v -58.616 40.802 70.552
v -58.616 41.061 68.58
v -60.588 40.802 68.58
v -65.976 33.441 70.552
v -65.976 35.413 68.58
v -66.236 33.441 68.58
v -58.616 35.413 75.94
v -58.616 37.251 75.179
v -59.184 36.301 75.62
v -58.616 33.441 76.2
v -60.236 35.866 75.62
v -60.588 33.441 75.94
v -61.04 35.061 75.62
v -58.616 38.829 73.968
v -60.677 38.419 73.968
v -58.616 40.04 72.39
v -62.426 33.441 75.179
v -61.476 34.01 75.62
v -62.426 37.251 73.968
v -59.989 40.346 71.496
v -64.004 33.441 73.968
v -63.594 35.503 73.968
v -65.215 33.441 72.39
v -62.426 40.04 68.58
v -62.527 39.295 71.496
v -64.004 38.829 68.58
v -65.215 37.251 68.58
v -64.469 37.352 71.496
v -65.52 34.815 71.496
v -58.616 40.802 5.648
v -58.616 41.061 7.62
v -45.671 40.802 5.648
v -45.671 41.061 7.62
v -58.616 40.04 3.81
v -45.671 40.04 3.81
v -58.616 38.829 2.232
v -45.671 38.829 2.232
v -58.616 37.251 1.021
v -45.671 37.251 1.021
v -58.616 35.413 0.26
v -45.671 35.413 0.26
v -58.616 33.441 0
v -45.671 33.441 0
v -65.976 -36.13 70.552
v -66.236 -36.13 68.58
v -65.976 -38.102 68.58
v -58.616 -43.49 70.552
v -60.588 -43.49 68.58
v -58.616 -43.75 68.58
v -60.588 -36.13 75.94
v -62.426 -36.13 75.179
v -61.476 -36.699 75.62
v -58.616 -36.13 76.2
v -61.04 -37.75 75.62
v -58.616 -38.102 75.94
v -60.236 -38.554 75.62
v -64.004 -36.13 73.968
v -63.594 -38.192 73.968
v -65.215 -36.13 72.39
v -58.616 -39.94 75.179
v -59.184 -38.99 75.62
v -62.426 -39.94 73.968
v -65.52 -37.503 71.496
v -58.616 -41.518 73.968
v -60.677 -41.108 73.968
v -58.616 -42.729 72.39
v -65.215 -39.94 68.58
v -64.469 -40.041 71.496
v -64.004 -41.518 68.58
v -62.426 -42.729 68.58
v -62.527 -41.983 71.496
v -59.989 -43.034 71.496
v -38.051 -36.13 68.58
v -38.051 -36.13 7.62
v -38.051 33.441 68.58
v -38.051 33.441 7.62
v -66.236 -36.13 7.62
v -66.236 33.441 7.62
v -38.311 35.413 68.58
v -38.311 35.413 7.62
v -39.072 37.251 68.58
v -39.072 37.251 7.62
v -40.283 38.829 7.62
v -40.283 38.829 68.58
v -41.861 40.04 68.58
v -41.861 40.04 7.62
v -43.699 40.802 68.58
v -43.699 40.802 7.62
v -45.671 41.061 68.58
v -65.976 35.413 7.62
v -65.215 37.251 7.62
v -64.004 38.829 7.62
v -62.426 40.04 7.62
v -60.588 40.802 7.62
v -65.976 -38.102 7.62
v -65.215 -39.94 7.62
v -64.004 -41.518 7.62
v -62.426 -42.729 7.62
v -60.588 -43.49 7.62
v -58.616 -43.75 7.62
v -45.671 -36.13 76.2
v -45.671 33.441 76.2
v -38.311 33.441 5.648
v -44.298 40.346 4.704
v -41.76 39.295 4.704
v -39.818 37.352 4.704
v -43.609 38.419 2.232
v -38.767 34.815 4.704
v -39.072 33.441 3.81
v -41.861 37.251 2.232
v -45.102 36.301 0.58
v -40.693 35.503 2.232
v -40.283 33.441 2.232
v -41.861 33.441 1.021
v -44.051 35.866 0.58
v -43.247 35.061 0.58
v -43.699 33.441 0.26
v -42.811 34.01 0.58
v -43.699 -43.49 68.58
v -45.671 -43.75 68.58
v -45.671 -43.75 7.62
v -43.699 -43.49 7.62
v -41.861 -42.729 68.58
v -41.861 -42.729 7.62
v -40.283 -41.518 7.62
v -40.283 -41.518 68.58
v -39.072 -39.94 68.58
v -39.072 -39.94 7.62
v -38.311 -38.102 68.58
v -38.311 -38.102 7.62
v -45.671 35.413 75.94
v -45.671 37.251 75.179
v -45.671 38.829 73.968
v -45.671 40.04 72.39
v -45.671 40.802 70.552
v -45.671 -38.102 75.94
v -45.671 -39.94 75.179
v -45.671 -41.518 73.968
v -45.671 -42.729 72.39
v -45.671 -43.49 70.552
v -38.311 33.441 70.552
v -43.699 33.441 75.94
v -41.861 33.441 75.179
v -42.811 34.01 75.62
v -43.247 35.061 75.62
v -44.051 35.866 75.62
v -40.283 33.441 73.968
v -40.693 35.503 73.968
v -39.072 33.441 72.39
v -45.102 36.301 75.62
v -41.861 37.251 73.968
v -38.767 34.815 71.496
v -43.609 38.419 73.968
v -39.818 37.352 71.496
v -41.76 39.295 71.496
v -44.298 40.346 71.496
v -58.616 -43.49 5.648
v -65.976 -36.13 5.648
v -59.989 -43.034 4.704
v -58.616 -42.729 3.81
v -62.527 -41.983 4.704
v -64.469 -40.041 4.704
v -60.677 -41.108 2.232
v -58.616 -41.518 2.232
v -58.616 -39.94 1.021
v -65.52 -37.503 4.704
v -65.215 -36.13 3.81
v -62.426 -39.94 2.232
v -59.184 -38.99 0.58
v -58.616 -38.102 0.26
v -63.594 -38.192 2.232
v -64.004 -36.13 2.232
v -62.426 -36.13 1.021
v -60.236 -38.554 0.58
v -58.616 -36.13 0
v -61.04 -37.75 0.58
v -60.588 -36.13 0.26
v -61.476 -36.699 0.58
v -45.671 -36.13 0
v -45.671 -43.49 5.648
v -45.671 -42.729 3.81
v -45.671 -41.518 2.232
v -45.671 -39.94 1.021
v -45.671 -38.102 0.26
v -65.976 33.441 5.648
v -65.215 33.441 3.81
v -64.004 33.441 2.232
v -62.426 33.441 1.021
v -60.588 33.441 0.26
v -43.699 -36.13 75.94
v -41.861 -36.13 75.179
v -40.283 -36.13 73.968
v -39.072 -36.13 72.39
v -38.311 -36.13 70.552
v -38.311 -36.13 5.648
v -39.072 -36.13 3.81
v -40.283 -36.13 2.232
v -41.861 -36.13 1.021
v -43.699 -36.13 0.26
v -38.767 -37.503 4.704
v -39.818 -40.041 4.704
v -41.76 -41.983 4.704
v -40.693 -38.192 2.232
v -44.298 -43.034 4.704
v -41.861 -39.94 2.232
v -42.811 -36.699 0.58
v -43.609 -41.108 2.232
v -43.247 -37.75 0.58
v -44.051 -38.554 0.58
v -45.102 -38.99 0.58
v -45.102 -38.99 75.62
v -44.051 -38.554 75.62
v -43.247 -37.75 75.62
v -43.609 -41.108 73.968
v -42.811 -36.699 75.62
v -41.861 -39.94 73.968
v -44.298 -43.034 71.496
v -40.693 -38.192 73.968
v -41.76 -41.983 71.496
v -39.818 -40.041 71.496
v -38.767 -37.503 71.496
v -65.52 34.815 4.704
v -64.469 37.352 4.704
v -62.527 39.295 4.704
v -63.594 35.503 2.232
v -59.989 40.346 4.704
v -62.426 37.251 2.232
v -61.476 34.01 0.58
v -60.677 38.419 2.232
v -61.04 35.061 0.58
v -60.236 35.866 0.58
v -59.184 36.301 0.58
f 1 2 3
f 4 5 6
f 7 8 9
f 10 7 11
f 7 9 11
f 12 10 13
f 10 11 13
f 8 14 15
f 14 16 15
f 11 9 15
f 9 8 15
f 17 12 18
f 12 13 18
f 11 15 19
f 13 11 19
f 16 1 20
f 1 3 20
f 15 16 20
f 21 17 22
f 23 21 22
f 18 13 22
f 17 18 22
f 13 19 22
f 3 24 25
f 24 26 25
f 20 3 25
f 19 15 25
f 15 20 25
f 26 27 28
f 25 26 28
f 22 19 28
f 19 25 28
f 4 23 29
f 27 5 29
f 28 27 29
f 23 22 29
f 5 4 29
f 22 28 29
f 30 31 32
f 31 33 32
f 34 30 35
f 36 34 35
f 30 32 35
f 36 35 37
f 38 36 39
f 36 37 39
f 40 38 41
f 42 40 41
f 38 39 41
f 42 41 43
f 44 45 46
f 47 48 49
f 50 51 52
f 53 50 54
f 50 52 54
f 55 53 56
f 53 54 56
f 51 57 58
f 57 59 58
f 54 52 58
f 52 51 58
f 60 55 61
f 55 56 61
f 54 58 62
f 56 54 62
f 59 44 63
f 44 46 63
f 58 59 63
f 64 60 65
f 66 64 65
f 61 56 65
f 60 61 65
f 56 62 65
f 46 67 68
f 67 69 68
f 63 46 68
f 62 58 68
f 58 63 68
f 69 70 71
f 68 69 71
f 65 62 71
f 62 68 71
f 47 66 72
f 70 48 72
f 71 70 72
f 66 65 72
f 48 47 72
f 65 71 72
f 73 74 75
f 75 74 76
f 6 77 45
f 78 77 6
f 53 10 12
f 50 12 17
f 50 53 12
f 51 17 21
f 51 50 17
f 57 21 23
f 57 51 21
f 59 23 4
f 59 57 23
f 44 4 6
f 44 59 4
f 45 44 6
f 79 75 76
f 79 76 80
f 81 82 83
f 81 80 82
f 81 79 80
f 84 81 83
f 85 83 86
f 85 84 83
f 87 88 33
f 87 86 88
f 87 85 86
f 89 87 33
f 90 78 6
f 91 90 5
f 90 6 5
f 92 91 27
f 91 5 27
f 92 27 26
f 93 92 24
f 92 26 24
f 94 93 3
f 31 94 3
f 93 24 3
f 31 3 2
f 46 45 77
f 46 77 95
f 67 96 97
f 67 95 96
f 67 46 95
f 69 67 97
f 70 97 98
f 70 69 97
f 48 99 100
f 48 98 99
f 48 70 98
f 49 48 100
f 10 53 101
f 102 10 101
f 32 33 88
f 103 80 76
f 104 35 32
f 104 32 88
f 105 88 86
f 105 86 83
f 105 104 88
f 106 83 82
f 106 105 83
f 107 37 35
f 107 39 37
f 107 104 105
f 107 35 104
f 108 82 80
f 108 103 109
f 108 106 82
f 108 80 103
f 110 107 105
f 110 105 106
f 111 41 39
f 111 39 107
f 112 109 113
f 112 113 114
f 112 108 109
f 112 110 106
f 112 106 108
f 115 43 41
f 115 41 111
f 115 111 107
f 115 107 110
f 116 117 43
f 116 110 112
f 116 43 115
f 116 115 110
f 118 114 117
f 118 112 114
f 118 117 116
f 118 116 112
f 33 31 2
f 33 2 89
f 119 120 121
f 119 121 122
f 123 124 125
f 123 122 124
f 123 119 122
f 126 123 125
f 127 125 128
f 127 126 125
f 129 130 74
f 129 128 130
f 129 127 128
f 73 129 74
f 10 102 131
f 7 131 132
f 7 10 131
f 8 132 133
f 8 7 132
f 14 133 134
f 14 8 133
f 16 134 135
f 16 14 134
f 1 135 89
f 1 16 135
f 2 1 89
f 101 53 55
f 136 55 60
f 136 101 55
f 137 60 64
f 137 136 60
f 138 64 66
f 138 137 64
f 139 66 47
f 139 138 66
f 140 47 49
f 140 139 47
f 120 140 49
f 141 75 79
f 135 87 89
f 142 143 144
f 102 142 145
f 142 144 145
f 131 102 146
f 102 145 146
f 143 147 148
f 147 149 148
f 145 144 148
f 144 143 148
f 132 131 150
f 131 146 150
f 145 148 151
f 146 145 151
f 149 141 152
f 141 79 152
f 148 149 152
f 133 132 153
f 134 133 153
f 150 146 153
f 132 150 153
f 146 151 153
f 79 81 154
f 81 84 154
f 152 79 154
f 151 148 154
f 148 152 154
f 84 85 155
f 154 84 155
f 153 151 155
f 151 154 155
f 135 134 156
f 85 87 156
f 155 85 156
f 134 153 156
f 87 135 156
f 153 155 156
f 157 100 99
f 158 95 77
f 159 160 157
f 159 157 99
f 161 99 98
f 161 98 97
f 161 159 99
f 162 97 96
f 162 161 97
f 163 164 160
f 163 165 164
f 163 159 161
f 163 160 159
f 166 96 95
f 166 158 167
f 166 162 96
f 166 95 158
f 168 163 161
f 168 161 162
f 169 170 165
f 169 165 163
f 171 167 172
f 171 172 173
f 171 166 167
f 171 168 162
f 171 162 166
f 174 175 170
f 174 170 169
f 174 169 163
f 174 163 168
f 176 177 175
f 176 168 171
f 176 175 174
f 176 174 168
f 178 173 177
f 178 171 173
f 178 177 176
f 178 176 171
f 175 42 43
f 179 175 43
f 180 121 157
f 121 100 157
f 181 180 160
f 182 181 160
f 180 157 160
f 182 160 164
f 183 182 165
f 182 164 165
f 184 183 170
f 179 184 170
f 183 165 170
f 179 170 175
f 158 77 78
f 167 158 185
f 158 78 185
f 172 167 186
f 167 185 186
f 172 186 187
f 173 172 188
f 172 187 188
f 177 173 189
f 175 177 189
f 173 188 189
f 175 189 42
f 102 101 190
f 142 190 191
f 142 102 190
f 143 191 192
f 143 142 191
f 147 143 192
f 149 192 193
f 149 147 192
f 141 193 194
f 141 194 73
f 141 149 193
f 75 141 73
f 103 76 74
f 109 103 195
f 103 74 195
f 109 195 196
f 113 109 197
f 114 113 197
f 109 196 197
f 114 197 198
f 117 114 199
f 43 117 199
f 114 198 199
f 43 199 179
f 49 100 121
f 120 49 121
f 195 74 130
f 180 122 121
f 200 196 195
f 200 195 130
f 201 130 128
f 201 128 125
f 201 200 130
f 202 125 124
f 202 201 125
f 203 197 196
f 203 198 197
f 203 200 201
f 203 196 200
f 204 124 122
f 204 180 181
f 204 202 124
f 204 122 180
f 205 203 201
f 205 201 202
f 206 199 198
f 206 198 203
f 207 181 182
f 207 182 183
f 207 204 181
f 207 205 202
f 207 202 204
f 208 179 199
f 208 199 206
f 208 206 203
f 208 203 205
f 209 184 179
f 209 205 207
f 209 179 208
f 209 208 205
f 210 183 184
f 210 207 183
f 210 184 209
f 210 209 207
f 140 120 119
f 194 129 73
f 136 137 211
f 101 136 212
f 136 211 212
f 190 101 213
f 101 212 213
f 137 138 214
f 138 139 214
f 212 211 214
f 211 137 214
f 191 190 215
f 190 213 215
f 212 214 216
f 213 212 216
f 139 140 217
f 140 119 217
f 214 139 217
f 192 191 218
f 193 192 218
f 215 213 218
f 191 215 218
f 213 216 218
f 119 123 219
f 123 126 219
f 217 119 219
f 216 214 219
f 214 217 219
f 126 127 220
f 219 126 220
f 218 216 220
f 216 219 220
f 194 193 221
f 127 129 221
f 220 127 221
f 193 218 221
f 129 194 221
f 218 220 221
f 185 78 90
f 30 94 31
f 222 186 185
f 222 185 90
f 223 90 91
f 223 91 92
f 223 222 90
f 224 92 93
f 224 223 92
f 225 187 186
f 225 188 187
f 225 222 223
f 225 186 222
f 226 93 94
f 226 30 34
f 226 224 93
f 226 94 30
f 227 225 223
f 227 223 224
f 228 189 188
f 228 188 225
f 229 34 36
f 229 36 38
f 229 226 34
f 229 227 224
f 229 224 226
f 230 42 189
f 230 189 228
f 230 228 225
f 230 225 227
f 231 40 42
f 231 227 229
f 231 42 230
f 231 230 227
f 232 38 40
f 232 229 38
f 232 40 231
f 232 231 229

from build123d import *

# Parameters (mm, degrees)
F0_W     = 28.184153
F0_H     = 84.810838
F1_DEPTH = 76.2
F2_R     = 7.62
F3_R     = 7.62


with BuildPart() as f1:
    # F0 (on Top) → F1 (new body)
    with BuildSketch(Plane.XY):
        with Locations((-52.143465, -1.344271)):
            Rectangle(F0_W, F0_H)
    extrude(amount=F1_DEPTH)

    # F2
    f2_edges = [f1.edges().sort_by_distance(p)[0] for p in [
        (-66.235542, 41.061148, 38.1),
        (-66.235542, -43.74969, 38.1),
        (-38.051389, -43.74969, 38.1),
        (-38.051389, 41.061148, 38.1),
    ]]
    fillet(f2_edges, radius=F2_R)

    # F3
    f3_edges = [f1.edges().sort_by_distance(p)[0] for p in [
        (-38.051389, -1.344271, 76.2),
        (-66.235542, -1.344271, 76.2),
        (-66.235542, -1.344271, 0),
        (-38.051389, -1.344271, 0),
    ]]
    fillet(f3_edges, radius=F3_R)


solid = f1.part
